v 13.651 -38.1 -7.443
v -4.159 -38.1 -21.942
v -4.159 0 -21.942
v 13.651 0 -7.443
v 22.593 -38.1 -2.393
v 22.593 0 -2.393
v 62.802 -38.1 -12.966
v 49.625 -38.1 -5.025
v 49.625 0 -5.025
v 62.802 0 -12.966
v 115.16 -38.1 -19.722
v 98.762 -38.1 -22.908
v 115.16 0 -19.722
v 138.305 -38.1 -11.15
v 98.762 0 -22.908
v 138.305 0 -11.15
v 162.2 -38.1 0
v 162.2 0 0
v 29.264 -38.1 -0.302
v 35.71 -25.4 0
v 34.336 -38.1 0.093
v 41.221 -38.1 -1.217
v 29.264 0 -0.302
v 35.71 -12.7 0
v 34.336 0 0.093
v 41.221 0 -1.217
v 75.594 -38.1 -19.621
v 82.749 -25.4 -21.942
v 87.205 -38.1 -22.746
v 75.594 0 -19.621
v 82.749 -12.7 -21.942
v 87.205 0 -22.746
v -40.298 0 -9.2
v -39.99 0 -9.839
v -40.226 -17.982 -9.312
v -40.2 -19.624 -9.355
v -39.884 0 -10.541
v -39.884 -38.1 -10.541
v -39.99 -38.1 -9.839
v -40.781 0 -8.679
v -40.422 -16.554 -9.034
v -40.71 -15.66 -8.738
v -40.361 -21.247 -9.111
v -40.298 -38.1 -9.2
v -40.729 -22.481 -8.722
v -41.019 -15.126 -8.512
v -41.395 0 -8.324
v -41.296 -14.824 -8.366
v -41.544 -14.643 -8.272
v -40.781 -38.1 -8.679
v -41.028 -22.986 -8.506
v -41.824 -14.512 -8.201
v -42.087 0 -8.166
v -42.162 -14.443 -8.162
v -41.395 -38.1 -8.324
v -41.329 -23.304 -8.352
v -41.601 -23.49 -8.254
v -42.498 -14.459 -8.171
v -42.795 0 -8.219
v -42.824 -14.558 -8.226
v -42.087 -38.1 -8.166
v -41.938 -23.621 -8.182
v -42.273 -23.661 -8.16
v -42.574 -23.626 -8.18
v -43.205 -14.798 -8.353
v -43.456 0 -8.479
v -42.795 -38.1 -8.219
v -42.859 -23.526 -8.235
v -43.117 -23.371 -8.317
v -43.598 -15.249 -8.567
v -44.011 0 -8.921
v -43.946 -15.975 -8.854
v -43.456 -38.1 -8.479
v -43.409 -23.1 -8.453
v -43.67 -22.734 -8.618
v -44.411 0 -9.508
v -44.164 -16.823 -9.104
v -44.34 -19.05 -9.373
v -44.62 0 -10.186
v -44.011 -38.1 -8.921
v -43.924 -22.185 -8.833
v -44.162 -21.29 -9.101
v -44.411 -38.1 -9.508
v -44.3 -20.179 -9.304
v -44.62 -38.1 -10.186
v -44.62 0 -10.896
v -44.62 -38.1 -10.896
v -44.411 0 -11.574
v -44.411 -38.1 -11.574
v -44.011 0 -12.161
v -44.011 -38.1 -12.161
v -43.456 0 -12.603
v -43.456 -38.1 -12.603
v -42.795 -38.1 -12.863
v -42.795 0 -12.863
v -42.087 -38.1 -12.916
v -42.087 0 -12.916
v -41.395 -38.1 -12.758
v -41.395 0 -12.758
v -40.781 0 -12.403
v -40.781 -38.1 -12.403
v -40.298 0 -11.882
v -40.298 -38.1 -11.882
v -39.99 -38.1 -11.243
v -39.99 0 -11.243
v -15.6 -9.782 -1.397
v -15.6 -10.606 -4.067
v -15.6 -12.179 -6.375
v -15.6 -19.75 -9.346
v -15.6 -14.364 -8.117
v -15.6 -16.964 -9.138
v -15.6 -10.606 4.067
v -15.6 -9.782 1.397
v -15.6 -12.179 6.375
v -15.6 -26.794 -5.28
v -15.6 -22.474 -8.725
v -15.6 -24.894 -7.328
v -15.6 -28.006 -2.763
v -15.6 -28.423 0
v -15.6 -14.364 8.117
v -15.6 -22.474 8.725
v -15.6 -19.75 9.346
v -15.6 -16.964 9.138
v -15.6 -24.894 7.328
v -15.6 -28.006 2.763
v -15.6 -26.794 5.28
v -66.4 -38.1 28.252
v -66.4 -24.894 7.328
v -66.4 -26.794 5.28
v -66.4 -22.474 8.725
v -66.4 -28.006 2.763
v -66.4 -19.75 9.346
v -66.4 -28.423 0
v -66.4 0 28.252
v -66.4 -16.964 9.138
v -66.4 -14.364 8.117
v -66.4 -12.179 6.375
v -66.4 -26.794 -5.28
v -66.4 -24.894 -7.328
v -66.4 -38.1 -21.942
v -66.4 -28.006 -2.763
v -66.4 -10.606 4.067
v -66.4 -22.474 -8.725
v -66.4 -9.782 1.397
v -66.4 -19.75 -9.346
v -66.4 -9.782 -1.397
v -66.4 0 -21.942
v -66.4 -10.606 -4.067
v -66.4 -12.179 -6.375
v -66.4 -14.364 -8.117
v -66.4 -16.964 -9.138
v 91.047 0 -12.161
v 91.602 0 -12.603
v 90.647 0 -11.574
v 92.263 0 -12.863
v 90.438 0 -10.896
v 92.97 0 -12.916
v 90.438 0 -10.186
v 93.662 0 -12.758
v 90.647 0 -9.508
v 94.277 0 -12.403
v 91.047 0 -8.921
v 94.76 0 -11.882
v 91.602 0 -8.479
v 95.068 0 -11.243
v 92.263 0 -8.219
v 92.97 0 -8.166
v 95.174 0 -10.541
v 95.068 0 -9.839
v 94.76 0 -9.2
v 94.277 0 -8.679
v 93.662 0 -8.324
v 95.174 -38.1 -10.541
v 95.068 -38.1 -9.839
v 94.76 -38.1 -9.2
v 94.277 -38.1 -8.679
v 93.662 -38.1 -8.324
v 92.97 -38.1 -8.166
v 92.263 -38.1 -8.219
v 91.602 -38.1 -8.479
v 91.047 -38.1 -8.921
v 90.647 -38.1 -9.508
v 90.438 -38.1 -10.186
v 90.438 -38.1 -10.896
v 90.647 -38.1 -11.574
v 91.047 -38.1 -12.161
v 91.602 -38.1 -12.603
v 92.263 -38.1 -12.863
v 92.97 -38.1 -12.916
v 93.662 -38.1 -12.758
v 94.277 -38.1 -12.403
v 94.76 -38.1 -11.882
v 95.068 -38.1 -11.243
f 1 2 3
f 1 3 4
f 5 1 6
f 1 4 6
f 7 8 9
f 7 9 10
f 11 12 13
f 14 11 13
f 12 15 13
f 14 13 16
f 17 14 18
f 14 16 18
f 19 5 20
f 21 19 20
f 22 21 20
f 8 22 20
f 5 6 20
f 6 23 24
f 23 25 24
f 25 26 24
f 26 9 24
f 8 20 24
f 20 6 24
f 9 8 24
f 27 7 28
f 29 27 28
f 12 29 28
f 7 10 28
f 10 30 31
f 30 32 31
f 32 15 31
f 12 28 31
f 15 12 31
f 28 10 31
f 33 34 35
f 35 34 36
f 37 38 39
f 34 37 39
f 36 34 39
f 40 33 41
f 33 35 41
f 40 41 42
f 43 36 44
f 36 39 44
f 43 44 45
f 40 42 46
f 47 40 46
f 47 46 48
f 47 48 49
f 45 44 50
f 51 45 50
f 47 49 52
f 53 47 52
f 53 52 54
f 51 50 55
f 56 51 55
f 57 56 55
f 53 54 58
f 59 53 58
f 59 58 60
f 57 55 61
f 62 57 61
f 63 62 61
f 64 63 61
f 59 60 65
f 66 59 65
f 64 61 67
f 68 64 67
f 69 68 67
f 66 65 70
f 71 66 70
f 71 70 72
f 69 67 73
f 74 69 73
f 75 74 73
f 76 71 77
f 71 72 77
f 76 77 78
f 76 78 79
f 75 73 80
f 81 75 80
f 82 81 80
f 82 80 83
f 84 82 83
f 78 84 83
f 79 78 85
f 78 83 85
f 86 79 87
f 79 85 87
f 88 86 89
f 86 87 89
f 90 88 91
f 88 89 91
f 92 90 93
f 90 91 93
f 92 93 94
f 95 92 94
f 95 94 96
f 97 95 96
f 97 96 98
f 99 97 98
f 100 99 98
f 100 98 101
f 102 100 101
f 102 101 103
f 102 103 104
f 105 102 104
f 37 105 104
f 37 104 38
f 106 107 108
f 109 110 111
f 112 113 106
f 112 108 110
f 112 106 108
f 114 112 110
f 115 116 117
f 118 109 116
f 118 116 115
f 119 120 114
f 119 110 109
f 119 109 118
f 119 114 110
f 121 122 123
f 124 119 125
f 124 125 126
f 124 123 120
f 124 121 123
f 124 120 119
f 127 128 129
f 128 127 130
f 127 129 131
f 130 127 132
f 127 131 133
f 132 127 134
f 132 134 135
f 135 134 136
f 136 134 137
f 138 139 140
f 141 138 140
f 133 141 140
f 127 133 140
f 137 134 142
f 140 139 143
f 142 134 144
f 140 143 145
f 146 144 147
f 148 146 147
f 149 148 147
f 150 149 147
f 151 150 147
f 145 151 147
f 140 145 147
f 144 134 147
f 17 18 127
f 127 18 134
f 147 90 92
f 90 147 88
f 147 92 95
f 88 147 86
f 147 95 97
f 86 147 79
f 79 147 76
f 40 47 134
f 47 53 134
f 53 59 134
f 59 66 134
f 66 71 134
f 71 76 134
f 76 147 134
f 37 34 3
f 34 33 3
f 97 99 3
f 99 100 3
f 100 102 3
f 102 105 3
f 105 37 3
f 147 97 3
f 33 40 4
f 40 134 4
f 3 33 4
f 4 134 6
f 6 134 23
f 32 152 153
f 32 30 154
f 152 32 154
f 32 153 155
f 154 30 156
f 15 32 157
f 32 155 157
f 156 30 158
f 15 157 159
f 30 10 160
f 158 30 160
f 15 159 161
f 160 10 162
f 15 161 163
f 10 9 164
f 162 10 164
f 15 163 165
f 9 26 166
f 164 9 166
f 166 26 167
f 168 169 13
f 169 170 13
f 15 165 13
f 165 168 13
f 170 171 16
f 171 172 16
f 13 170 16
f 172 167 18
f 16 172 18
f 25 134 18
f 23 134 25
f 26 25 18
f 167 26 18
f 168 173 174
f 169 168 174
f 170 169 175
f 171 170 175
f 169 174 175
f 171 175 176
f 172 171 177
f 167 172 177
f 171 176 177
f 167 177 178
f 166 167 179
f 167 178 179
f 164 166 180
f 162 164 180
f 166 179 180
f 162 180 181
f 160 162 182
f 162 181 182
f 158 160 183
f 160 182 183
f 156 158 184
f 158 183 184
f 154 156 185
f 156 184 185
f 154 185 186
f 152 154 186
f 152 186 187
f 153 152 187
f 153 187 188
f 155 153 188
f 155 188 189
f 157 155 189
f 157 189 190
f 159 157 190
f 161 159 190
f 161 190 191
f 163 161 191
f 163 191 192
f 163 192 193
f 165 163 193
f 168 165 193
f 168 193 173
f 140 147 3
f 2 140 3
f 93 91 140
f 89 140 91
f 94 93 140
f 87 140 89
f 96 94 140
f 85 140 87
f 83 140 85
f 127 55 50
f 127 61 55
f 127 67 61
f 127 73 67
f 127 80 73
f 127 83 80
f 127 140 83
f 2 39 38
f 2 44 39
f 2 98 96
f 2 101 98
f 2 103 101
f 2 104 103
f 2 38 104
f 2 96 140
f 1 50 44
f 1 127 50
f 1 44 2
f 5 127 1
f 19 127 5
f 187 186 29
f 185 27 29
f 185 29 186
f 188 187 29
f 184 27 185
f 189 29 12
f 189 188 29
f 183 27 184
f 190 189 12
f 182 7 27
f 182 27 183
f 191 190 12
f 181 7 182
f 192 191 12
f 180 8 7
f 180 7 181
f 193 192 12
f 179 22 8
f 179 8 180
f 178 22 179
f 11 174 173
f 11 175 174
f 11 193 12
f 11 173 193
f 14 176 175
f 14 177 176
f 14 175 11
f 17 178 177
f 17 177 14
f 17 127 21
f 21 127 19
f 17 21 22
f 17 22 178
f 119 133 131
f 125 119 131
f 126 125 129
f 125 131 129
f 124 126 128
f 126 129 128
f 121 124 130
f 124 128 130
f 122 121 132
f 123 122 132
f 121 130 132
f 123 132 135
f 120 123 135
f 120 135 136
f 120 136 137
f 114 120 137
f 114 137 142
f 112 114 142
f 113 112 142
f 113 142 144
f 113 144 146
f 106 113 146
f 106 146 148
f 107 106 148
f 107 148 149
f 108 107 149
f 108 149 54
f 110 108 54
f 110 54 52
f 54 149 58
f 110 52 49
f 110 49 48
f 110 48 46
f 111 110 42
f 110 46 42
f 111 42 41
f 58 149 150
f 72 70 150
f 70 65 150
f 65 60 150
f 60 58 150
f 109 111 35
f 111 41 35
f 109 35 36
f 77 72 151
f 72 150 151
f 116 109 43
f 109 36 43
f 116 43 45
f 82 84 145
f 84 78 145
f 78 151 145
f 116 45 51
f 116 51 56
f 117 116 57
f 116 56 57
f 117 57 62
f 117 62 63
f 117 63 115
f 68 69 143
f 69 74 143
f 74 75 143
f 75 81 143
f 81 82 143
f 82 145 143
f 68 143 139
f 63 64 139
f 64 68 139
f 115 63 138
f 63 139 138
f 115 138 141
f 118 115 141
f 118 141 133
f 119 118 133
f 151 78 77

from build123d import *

# Parameters (mm, degrees)
F1_DEPTH = 38.1
F2_R     = 2.38125
F3_DEPTH = 50.8
F4_R     = 9.3726
F5_DEPTH = 50.8


with BuildPart() as f1:
    # F0 (on Front) → F1 (new body)
    with BuildSketch(Plane.XZ):
        with BuildLine():
            Line((162.1998757672, 0), (-66.4001242328, 28.252322495))
            Line((-66.4001242328, 28.252322495), (-66.4001242328, -21.9421586787))
            Line((-66.4001242328, -21.9421586787), (-4.1589712477, -21.9421586787))
            add(Edge.make_bspline(
                [(-4.1589712477, -21.9421586787), (9.0570730375, -10.2995880159), (36.3875579336, 13.7769885137), (83.061952184, -38.1511215036), (133.8711179096, -13.656839024), (162.1998757672, 0)],
                knots=[0, 0, 0, 0, 0.292929283, 0.6057712256, 1, 1, 1, 1], degree=3))
        make_face()
    extrude(amount=F1_DEPTH)

    # F2 (on face) → F3 (cut)
    with BuildSketch(Plane.XZ.offset(38.1)):
        with Locations((92.7924972183, -10.5410022661)):
            Circle(F2_R)
        with Locations((-42.2653563885, -10.5410022661)):
            Circle(F2_R)
    extrude(amount=-F3_DEPTH, mode=Mode.SUBTRACT)

    # F4 (on face) → F5 (cut)
    with BuildSketch(Plane(origin=(-66.4001242328, 0, 0), x_dir=(0, -1, 0), z_dir=(-1, 0, 0))):
        with Locations((19.05, 0)):
            Circle(F4_R)
    extrude(amount=-F5_DEPTH, mode=Mode.SUBTRACT)


solid = f1.part
